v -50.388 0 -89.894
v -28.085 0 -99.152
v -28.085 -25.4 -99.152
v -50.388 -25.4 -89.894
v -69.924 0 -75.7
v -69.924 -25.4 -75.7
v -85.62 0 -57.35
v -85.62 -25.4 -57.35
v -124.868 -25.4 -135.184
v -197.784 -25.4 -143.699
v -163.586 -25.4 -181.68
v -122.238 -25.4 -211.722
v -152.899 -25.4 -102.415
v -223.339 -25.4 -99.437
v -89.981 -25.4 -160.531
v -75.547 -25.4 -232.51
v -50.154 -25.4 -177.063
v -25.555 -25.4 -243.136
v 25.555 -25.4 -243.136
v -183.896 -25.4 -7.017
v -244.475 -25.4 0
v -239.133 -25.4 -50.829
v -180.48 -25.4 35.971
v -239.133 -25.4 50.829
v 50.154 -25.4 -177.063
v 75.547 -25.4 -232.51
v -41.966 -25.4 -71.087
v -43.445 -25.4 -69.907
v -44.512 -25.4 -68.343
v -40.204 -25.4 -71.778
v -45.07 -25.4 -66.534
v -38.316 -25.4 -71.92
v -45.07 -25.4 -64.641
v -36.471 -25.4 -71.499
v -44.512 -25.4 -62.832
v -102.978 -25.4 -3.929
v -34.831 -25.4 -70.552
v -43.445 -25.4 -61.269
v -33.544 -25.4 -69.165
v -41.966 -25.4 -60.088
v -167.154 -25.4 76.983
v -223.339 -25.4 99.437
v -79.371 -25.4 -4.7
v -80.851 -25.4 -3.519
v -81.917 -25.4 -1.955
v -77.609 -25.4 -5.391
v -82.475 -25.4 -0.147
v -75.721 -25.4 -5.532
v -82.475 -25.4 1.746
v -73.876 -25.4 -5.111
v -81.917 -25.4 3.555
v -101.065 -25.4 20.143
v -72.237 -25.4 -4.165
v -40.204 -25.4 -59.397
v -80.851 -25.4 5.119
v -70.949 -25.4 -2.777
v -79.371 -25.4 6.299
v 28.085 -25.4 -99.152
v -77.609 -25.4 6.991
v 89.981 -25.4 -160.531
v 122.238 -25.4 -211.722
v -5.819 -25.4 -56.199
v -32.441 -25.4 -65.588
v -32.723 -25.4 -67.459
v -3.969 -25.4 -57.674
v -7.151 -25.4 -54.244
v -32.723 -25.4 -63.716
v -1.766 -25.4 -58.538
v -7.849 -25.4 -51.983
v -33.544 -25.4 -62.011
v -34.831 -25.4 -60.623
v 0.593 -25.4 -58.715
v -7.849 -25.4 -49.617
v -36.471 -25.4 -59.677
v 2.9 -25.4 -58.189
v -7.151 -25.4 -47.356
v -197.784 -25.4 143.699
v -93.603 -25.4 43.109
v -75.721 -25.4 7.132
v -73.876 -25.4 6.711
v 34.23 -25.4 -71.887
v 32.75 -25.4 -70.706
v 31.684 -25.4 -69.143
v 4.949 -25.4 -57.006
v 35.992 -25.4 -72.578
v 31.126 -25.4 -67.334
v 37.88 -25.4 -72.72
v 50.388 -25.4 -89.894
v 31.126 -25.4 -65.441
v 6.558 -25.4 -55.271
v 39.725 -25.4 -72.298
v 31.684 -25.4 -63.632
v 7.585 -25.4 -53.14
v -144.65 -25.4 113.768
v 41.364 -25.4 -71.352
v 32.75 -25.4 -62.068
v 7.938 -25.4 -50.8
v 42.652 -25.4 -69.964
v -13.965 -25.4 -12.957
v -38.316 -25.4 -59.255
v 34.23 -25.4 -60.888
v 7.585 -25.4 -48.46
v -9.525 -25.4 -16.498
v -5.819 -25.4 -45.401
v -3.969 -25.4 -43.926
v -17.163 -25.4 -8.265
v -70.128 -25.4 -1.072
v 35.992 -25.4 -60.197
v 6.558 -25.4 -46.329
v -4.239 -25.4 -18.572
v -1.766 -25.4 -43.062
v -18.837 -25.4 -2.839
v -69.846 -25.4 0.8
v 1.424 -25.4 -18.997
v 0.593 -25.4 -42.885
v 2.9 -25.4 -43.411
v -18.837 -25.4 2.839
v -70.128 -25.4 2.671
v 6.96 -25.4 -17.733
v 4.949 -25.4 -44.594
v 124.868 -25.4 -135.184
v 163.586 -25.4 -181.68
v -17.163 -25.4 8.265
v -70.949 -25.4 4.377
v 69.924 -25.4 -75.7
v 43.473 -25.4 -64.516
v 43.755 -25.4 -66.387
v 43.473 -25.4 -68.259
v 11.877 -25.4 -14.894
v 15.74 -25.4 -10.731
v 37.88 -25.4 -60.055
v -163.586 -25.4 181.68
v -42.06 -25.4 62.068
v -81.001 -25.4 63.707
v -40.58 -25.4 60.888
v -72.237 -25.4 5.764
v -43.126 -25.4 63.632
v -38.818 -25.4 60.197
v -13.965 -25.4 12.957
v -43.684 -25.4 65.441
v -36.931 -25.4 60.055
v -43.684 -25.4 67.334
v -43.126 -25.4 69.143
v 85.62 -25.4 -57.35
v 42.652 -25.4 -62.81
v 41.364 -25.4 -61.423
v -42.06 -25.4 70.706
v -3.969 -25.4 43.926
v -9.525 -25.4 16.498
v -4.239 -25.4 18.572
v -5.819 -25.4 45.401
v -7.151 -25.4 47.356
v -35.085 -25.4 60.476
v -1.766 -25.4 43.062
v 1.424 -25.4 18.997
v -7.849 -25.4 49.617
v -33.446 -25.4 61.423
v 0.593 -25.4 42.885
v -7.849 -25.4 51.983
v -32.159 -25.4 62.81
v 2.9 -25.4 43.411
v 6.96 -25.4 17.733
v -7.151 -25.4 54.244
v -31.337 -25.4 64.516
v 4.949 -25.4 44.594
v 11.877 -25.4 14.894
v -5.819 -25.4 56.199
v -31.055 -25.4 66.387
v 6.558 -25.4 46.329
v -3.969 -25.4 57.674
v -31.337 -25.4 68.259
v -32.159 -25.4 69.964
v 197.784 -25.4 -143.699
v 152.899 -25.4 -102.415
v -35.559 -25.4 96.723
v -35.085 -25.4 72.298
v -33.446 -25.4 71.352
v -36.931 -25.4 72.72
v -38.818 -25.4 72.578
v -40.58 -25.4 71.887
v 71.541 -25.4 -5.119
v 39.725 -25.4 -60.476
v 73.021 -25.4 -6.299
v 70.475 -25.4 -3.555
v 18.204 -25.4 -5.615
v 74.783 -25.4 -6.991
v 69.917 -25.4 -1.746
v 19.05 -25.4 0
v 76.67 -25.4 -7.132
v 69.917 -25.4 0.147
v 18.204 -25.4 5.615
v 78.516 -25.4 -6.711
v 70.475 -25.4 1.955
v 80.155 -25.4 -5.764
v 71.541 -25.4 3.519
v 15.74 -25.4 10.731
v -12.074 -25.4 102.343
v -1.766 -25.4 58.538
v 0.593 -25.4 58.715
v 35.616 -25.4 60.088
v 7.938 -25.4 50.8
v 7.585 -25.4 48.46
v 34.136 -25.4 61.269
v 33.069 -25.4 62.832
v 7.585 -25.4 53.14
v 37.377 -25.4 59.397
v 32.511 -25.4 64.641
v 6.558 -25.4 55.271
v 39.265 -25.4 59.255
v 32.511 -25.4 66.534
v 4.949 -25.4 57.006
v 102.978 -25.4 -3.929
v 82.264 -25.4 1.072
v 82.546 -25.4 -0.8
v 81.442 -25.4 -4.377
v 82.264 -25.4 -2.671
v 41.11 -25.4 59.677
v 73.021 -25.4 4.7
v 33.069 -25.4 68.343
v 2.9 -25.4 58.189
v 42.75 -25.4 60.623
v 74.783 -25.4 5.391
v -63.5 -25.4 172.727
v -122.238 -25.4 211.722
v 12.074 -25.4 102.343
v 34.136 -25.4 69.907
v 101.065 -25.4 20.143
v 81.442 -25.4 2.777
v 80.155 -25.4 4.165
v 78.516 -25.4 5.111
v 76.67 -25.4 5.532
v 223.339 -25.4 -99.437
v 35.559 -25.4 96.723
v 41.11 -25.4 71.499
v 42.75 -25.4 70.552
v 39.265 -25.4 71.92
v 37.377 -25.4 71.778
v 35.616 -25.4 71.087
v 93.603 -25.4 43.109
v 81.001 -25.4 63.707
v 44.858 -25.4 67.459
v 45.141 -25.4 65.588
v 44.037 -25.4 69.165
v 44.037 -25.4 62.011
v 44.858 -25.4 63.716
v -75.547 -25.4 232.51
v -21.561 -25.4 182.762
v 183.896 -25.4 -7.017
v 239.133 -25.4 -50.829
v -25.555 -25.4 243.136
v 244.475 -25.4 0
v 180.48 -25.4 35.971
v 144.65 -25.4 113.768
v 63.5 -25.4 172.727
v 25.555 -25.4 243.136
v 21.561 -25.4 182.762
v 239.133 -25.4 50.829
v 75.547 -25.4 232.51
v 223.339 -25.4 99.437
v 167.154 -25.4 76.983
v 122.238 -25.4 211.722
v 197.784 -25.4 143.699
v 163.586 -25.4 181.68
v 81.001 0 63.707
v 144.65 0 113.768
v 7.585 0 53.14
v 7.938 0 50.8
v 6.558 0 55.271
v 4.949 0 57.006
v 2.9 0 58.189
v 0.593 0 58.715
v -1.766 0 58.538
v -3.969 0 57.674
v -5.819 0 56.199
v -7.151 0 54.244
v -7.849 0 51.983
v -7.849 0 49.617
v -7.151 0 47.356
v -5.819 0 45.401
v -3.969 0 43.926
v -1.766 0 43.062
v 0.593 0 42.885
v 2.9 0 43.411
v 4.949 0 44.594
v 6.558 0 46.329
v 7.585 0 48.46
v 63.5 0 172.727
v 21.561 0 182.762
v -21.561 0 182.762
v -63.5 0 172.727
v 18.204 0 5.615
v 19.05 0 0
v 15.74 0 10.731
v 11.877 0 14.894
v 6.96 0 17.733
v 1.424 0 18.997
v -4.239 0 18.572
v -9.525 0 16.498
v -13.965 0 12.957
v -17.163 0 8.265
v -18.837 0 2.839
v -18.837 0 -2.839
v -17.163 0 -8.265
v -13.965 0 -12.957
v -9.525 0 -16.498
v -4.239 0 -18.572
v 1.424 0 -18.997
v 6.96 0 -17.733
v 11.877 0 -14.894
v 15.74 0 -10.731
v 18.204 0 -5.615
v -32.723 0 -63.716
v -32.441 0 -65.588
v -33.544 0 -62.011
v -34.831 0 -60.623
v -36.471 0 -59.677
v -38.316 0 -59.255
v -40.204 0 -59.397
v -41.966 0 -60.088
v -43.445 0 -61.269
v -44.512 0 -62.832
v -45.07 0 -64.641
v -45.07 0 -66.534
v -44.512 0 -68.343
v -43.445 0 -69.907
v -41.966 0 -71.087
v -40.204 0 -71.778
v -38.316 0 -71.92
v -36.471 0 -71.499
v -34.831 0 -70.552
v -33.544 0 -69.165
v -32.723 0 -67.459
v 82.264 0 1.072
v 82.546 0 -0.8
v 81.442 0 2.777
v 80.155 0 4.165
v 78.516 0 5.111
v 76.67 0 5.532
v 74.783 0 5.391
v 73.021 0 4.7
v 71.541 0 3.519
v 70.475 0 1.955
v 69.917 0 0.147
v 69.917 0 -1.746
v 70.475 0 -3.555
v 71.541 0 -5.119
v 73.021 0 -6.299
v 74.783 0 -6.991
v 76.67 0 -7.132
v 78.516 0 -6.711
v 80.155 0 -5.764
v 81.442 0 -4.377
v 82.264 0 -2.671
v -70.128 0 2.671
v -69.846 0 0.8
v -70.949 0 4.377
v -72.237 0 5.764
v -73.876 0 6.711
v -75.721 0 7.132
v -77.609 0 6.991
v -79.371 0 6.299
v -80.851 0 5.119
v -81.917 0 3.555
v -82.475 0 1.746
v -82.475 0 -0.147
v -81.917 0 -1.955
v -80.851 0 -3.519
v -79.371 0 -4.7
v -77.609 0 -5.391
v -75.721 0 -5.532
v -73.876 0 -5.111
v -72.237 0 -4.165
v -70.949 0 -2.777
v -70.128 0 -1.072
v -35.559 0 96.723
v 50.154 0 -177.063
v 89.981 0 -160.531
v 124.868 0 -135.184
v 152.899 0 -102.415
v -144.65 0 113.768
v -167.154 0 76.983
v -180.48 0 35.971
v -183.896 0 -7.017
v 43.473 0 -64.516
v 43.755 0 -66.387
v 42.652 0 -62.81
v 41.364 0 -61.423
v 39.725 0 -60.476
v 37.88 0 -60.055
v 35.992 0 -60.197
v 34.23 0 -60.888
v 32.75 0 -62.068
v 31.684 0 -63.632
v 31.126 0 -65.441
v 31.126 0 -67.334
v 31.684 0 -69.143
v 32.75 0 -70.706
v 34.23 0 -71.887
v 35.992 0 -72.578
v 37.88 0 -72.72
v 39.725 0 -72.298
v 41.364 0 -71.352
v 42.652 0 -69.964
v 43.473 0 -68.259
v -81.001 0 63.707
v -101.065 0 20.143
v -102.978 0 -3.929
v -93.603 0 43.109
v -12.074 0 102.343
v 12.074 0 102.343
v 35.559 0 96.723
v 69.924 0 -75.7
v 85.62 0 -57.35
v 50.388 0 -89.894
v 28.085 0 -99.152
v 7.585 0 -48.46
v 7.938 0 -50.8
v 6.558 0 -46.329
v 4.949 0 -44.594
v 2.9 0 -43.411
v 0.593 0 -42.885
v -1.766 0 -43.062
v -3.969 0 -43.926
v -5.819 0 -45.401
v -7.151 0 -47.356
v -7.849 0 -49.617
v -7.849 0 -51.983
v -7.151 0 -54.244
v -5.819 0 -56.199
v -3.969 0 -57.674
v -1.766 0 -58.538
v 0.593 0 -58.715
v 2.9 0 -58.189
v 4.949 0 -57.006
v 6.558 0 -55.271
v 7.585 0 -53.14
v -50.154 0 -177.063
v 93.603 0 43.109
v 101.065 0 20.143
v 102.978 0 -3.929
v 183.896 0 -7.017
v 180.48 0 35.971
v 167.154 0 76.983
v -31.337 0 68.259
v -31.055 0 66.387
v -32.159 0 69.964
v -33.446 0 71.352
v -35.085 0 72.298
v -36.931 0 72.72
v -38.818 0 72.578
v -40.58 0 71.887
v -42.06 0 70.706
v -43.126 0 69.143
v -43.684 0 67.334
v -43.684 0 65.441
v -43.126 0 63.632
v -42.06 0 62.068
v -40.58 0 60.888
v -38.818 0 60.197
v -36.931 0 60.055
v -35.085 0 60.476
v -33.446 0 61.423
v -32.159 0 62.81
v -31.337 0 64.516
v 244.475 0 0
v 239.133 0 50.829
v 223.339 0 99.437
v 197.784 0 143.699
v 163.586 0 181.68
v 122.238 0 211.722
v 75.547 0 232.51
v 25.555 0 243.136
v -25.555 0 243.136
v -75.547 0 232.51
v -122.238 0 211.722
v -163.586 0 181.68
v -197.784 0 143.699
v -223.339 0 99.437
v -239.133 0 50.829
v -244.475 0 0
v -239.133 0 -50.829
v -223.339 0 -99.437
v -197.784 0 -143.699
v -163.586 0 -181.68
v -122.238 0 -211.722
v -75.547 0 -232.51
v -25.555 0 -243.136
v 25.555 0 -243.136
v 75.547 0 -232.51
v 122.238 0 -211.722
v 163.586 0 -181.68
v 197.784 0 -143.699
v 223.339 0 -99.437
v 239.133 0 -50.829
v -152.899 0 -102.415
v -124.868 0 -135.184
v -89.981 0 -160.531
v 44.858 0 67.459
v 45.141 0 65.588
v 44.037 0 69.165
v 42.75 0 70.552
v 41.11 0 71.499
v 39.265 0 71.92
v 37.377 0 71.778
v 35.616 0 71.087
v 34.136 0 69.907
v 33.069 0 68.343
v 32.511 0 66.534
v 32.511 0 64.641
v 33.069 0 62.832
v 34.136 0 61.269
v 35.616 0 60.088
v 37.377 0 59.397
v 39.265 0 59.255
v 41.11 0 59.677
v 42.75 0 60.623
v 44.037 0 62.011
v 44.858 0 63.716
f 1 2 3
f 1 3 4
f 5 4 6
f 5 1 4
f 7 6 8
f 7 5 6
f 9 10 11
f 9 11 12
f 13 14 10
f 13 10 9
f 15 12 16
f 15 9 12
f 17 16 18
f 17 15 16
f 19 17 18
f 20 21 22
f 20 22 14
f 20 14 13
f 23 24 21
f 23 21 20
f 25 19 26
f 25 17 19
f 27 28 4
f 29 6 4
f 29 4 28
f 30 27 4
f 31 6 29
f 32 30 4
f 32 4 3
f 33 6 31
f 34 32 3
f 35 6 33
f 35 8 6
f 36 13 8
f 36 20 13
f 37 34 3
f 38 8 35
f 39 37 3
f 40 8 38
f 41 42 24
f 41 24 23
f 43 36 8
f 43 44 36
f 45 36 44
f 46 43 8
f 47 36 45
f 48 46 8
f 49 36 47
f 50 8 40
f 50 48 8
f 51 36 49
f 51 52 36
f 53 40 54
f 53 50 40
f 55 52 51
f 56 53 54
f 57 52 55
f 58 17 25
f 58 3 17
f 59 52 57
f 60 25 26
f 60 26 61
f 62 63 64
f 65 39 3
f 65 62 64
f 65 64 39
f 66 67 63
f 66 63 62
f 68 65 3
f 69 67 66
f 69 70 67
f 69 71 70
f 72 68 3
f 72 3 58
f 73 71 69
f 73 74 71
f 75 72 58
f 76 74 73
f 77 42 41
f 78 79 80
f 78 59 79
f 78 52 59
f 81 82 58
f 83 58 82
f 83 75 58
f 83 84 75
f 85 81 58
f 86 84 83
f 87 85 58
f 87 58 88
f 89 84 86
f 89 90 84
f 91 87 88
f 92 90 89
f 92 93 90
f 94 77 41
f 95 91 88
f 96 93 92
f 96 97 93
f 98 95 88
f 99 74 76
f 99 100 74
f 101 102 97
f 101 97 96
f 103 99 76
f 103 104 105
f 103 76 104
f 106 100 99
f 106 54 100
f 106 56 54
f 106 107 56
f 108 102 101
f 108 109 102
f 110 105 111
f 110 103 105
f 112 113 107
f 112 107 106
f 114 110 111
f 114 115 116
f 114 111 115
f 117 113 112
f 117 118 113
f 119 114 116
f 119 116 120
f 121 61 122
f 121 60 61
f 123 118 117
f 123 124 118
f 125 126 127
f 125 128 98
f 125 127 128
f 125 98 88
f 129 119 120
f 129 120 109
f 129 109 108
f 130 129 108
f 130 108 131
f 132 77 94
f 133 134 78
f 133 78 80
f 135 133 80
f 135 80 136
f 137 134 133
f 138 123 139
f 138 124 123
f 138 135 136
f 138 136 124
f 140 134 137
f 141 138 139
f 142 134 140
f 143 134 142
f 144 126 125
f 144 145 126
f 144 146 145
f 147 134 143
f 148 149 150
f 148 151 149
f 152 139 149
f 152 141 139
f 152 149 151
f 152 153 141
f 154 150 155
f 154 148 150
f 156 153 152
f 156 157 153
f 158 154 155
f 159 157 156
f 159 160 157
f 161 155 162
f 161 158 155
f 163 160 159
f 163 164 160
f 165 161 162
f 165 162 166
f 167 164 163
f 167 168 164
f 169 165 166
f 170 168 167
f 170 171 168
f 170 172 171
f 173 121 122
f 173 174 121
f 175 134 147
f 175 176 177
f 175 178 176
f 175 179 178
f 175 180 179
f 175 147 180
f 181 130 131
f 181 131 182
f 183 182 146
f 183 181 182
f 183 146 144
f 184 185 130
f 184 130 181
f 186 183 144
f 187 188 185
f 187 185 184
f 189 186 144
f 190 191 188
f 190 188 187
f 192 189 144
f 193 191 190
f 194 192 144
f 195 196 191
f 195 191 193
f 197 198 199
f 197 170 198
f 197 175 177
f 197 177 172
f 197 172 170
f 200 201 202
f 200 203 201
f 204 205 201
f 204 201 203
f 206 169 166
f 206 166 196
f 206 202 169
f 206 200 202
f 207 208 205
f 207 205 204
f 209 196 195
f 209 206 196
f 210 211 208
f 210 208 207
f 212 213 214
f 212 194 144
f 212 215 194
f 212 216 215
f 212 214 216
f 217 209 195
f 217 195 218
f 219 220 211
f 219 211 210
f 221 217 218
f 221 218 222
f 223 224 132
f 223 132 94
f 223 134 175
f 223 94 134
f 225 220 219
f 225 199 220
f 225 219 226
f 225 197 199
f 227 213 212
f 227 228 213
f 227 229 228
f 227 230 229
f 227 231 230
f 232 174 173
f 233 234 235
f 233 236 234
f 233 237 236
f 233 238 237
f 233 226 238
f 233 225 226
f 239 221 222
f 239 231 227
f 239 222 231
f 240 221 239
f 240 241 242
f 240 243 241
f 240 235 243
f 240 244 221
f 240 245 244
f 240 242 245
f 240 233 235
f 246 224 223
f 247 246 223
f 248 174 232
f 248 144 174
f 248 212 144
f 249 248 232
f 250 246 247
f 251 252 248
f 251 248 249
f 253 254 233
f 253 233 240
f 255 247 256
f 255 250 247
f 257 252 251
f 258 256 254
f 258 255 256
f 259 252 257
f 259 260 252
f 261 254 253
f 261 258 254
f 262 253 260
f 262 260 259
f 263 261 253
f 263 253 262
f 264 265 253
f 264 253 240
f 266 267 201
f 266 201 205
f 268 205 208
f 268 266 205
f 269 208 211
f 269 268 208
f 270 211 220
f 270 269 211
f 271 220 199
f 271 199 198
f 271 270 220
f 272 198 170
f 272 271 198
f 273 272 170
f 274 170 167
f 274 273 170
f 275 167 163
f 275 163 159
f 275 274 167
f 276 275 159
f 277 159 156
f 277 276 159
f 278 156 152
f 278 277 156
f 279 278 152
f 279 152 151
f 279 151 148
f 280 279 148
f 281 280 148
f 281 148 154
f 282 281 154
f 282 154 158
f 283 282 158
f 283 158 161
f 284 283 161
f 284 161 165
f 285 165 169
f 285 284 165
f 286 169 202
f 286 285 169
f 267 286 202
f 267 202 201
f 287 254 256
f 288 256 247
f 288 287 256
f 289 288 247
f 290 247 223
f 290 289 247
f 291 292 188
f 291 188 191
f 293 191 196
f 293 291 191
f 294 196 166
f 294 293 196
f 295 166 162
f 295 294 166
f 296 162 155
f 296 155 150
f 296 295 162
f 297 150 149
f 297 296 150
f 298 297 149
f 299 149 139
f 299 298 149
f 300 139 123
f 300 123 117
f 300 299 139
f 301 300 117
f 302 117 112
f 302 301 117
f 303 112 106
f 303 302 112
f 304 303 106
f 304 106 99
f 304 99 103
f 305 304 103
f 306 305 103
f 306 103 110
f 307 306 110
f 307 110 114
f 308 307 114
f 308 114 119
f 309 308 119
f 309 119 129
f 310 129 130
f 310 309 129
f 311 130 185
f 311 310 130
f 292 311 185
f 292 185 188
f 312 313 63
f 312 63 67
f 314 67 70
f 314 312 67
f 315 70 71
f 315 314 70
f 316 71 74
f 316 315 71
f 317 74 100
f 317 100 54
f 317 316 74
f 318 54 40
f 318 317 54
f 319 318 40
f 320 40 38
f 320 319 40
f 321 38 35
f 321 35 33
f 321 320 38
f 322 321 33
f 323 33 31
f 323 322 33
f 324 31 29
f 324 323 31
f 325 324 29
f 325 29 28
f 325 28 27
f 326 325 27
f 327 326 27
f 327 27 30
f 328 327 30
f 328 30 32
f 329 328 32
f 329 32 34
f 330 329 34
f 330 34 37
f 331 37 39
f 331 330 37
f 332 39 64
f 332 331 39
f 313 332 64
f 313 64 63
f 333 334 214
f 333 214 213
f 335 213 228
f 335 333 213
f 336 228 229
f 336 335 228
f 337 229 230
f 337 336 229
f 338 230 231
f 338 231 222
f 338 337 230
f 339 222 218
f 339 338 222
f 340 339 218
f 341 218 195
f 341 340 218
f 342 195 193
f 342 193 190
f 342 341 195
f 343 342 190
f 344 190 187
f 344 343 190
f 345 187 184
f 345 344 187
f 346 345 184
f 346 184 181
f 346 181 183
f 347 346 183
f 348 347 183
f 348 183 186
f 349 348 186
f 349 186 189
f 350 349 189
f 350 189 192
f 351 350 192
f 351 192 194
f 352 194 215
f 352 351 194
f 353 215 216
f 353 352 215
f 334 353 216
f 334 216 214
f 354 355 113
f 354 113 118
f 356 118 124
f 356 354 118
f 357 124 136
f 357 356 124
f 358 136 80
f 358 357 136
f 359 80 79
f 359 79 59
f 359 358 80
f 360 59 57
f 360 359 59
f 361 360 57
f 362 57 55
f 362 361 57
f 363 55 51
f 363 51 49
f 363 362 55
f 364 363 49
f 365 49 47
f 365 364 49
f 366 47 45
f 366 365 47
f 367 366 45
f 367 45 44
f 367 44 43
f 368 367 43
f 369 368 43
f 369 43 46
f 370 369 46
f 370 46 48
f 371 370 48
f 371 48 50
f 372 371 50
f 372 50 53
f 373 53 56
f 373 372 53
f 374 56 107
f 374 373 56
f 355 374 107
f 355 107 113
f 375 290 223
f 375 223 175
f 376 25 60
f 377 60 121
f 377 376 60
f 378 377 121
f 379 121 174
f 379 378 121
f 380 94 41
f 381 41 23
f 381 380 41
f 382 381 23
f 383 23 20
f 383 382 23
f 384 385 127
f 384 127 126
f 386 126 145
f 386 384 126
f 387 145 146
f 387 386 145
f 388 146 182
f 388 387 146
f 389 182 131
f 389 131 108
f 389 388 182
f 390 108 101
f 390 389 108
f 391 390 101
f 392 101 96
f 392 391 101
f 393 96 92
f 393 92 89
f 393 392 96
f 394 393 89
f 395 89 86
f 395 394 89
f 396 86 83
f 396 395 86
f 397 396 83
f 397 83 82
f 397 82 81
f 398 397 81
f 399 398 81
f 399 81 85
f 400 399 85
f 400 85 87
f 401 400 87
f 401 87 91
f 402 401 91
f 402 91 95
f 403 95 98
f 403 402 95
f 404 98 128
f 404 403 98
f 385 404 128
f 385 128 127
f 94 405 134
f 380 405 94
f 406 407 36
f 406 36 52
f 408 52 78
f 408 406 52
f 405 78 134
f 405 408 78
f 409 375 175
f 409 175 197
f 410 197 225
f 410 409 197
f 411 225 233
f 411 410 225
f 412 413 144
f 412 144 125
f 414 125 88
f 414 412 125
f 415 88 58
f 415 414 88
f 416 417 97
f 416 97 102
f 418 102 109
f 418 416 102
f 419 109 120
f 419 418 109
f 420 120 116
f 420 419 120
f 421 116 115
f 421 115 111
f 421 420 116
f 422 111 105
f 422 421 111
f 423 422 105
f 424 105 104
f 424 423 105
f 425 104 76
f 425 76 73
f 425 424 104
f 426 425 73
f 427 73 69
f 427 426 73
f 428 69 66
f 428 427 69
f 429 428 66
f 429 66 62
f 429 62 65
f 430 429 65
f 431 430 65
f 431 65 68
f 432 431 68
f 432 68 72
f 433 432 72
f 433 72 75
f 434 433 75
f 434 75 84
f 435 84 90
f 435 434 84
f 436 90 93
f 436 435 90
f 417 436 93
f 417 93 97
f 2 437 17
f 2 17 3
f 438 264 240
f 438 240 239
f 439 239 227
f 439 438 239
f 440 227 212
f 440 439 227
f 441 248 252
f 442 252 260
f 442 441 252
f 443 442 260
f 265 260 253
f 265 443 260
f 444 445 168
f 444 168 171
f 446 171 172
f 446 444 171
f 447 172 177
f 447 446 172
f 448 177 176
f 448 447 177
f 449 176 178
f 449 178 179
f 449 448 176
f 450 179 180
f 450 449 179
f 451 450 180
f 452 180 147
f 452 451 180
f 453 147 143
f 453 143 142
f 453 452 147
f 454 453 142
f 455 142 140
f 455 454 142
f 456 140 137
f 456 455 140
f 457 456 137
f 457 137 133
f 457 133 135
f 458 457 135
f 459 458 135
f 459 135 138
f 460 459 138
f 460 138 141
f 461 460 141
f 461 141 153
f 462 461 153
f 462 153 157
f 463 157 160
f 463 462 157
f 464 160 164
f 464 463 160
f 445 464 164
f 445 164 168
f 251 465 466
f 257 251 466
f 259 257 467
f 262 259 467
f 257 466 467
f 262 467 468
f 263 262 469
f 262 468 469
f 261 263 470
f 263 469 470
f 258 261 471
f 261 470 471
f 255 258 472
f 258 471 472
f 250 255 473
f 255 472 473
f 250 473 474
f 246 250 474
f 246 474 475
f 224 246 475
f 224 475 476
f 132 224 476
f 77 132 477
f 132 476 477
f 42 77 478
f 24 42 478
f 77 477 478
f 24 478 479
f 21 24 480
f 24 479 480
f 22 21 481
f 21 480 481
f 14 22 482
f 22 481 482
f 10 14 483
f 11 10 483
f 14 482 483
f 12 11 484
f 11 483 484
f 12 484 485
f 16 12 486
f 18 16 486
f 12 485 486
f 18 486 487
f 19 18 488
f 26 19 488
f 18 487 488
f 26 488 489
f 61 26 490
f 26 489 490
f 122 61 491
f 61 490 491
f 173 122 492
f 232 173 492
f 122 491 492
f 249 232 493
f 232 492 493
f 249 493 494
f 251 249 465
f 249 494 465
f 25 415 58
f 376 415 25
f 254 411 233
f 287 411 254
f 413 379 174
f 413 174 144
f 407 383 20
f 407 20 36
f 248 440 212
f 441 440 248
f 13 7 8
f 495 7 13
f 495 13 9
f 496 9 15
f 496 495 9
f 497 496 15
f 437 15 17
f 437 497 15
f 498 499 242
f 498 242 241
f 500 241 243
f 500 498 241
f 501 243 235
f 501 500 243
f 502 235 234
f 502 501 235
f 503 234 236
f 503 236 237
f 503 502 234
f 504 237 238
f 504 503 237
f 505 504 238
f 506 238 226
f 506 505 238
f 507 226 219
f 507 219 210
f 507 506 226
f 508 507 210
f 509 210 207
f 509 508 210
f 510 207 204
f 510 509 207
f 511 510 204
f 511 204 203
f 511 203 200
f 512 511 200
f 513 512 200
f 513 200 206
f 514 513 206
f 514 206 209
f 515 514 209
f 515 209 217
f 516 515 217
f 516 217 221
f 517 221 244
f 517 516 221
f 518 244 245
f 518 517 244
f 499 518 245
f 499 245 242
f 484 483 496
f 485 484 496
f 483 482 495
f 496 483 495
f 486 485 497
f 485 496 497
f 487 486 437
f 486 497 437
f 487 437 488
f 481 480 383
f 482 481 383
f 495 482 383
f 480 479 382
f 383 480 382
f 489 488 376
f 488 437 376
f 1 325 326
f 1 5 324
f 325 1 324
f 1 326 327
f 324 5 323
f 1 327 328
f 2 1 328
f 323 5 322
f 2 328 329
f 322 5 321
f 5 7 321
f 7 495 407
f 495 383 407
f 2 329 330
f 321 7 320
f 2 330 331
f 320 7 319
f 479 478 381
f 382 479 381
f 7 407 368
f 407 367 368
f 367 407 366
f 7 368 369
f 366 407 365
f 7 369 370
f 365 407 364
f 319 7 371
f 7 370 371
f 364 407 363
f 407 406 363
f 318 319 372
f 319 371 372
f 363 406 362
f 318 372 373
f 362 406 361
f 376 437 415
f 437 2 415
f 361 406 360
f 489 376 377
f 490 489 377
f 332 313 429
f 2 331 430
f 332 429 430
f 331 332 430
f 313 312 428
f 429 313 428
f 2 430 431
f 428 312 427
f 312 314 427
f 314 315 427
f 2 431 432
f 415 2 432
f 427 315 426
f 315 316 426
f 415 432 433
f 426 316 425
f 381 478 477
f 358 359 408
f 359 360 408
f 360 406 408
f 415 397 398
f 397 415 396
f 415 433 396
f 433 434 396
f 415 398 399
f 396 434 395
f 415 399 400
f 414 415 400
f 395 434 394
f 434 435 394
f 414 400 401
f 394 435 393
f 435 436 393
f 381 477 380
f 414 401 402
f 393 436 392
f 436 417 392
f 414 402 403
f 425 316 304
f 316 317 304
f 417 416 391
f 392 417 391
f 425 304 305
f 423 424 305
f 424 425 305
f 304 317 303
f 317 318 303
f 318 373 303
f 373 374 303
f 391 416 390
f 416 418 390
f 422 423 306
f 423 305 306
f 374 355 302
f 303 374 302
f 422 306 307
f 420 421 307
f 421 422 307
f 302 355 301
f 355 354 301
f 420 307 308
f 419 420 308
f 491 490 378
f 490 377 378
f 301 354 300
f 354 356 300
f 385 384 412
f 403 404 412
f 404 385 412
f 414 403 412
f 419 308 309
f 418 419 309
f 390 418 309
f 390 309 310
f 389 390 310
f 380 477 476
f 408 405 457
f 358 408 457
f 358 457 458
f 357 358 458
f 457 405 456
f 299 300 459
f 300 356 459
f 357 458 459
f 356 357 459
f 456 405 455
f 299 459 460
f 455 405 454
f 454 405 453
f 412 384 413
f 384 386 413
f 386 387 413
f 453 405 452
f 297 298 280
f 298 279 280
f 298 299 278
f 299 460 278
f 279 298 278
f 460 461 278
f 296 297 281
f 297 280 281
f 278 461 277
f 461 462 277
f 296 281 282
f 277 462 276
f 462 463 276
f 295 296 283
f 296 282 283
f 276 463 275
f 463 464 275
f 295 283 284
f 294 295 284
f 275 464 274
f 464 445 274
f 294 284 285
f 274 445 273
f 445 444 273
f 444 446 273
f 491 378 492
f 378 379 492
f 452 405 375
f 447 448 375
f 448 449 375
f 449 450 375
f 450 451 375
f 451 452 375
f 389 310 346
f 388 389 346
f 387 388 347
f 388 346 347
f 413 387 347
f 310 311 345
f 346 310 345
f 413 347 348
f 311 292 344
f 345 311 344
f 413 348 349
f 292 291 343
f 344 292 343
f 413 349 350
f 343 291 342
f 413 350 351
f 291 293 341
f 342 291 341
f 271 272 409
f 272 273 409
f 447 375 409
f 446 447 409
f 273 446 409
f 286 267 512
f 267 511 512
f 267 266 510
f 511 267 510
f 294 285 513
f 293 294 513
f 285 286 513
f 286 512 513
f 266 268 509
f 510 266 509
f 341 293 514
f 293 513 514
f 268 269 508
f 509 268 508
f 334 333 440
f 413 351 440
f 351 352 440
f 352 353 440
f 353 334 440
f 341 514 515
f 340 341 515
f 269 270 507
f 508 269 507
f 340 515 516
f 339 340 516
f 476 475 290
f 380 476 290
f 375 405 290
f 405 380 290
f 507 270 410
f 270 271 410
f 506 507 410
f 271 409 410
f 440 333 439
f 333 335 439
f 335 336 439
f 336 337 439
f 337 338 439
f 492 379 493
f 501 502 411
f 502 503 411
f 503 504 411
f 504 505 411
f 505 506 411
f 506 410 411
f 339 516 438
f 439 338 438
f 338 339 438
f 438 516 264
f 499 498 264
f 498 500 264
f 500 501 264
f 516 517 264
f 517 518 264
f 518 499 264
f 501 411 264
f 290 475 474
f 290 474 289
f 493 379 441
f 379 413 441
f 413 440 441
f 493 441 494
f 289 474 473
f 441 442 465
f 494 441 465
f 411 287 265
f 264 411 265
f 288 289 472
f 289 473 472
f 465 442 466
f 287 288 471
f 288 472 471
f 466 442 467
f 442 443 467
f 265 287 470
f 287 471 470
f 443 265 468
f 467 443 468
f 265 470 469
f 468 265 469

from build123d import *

# Parameters (mm, degrees)
F0_R            = 244.475
F0_R_2          = 6.35
F0_R_3          = 7.9375
F0_R_4          = 19.05
F1_DEPTH        = 25.4
F3_DEPTH        = 25.4
F3_COPIES_COUNT = 5


# Not quite as in the source:
# - a pattern or mirror of a feature is missing from the dataset's text; its kind, count and spacing are read off the source's solid


with BuildPart() as f1:
    # F0 (on Front) → F1 (new body)
    with BuildSketch(Plane.XZ):
        Circle(F0_R)
        with Locations((-38.7905028095, -65.5876275817)):
            Circle(F0_R_2, mode=Mode.SUBTRACT)
        with Locations((37.4053002549, -66.3873746494)):
            Circle(F0_R_2, mode=Mode.SUBTRACT)
        with Locations((0, -50.8)):
            Circle(F0_R_3, mode=Mode.SUBTRACT)
        with Locations((76.1958030644, -0.7997470677)):
            Circle(F0_R_2, mode=Mode.SUBTRACT)
        with Locations((-76.1958030644, 0.7997470677)):
            Circle(F0_R_2, mode=Mode.SUBTRACT)
        with Locations((-37.4053002549, 66.3873746494)):
            Circle(F0_R_2, mode=Mode.SUBTRACT)
        Circle(F0_R_4, mode=Mode.SUBTRACT)
        with Locations((0, 50.8)):
            Circle(F0_R_3, mode=Mode.SUBTRACT)
        with Locations((38.7905028095, 65.5876275817)):
            Circle(F0_R_2, mode=Mode.SUBTRACT)
    extrude(amount=F1_DEPTH)

    # F2 (on Front) → F3 (cut, through all)
    with BuildSketch(Plane.XZ):
        with BuildLine():
            ThreePointArc((-35.5586123208, 96.7233082276), (0, 103.0524782073), (35.5586123208, 96.7233082276))
            Line((35.5586123208, 96.7233082276), (63.5, 172.7269336903))
            ThreePointArc((63.5, 172.7269336903), (0, 184.0294640053), (-63.5, 172.7269336903))
            Line((-63.5, 172.7269336903), (-35.5586123208, 96.7233082276))
        make_face()
    f3 = extrude(amount=F3_DEPTH, mode=Mode.SUBTRACT)

    # F3_copies: F3 ×5 about axis
    f3_copies_axis = Axis((0, 0, 0), (0, 1, 0))
    for i in range(1, F3_COPIES_COUNT):
        add(f3.rotate(f3_copies_axis, i * 360 / F3_COPIES_COUNT), mode=Mode.SUBTRACT)


solid = f1.part
